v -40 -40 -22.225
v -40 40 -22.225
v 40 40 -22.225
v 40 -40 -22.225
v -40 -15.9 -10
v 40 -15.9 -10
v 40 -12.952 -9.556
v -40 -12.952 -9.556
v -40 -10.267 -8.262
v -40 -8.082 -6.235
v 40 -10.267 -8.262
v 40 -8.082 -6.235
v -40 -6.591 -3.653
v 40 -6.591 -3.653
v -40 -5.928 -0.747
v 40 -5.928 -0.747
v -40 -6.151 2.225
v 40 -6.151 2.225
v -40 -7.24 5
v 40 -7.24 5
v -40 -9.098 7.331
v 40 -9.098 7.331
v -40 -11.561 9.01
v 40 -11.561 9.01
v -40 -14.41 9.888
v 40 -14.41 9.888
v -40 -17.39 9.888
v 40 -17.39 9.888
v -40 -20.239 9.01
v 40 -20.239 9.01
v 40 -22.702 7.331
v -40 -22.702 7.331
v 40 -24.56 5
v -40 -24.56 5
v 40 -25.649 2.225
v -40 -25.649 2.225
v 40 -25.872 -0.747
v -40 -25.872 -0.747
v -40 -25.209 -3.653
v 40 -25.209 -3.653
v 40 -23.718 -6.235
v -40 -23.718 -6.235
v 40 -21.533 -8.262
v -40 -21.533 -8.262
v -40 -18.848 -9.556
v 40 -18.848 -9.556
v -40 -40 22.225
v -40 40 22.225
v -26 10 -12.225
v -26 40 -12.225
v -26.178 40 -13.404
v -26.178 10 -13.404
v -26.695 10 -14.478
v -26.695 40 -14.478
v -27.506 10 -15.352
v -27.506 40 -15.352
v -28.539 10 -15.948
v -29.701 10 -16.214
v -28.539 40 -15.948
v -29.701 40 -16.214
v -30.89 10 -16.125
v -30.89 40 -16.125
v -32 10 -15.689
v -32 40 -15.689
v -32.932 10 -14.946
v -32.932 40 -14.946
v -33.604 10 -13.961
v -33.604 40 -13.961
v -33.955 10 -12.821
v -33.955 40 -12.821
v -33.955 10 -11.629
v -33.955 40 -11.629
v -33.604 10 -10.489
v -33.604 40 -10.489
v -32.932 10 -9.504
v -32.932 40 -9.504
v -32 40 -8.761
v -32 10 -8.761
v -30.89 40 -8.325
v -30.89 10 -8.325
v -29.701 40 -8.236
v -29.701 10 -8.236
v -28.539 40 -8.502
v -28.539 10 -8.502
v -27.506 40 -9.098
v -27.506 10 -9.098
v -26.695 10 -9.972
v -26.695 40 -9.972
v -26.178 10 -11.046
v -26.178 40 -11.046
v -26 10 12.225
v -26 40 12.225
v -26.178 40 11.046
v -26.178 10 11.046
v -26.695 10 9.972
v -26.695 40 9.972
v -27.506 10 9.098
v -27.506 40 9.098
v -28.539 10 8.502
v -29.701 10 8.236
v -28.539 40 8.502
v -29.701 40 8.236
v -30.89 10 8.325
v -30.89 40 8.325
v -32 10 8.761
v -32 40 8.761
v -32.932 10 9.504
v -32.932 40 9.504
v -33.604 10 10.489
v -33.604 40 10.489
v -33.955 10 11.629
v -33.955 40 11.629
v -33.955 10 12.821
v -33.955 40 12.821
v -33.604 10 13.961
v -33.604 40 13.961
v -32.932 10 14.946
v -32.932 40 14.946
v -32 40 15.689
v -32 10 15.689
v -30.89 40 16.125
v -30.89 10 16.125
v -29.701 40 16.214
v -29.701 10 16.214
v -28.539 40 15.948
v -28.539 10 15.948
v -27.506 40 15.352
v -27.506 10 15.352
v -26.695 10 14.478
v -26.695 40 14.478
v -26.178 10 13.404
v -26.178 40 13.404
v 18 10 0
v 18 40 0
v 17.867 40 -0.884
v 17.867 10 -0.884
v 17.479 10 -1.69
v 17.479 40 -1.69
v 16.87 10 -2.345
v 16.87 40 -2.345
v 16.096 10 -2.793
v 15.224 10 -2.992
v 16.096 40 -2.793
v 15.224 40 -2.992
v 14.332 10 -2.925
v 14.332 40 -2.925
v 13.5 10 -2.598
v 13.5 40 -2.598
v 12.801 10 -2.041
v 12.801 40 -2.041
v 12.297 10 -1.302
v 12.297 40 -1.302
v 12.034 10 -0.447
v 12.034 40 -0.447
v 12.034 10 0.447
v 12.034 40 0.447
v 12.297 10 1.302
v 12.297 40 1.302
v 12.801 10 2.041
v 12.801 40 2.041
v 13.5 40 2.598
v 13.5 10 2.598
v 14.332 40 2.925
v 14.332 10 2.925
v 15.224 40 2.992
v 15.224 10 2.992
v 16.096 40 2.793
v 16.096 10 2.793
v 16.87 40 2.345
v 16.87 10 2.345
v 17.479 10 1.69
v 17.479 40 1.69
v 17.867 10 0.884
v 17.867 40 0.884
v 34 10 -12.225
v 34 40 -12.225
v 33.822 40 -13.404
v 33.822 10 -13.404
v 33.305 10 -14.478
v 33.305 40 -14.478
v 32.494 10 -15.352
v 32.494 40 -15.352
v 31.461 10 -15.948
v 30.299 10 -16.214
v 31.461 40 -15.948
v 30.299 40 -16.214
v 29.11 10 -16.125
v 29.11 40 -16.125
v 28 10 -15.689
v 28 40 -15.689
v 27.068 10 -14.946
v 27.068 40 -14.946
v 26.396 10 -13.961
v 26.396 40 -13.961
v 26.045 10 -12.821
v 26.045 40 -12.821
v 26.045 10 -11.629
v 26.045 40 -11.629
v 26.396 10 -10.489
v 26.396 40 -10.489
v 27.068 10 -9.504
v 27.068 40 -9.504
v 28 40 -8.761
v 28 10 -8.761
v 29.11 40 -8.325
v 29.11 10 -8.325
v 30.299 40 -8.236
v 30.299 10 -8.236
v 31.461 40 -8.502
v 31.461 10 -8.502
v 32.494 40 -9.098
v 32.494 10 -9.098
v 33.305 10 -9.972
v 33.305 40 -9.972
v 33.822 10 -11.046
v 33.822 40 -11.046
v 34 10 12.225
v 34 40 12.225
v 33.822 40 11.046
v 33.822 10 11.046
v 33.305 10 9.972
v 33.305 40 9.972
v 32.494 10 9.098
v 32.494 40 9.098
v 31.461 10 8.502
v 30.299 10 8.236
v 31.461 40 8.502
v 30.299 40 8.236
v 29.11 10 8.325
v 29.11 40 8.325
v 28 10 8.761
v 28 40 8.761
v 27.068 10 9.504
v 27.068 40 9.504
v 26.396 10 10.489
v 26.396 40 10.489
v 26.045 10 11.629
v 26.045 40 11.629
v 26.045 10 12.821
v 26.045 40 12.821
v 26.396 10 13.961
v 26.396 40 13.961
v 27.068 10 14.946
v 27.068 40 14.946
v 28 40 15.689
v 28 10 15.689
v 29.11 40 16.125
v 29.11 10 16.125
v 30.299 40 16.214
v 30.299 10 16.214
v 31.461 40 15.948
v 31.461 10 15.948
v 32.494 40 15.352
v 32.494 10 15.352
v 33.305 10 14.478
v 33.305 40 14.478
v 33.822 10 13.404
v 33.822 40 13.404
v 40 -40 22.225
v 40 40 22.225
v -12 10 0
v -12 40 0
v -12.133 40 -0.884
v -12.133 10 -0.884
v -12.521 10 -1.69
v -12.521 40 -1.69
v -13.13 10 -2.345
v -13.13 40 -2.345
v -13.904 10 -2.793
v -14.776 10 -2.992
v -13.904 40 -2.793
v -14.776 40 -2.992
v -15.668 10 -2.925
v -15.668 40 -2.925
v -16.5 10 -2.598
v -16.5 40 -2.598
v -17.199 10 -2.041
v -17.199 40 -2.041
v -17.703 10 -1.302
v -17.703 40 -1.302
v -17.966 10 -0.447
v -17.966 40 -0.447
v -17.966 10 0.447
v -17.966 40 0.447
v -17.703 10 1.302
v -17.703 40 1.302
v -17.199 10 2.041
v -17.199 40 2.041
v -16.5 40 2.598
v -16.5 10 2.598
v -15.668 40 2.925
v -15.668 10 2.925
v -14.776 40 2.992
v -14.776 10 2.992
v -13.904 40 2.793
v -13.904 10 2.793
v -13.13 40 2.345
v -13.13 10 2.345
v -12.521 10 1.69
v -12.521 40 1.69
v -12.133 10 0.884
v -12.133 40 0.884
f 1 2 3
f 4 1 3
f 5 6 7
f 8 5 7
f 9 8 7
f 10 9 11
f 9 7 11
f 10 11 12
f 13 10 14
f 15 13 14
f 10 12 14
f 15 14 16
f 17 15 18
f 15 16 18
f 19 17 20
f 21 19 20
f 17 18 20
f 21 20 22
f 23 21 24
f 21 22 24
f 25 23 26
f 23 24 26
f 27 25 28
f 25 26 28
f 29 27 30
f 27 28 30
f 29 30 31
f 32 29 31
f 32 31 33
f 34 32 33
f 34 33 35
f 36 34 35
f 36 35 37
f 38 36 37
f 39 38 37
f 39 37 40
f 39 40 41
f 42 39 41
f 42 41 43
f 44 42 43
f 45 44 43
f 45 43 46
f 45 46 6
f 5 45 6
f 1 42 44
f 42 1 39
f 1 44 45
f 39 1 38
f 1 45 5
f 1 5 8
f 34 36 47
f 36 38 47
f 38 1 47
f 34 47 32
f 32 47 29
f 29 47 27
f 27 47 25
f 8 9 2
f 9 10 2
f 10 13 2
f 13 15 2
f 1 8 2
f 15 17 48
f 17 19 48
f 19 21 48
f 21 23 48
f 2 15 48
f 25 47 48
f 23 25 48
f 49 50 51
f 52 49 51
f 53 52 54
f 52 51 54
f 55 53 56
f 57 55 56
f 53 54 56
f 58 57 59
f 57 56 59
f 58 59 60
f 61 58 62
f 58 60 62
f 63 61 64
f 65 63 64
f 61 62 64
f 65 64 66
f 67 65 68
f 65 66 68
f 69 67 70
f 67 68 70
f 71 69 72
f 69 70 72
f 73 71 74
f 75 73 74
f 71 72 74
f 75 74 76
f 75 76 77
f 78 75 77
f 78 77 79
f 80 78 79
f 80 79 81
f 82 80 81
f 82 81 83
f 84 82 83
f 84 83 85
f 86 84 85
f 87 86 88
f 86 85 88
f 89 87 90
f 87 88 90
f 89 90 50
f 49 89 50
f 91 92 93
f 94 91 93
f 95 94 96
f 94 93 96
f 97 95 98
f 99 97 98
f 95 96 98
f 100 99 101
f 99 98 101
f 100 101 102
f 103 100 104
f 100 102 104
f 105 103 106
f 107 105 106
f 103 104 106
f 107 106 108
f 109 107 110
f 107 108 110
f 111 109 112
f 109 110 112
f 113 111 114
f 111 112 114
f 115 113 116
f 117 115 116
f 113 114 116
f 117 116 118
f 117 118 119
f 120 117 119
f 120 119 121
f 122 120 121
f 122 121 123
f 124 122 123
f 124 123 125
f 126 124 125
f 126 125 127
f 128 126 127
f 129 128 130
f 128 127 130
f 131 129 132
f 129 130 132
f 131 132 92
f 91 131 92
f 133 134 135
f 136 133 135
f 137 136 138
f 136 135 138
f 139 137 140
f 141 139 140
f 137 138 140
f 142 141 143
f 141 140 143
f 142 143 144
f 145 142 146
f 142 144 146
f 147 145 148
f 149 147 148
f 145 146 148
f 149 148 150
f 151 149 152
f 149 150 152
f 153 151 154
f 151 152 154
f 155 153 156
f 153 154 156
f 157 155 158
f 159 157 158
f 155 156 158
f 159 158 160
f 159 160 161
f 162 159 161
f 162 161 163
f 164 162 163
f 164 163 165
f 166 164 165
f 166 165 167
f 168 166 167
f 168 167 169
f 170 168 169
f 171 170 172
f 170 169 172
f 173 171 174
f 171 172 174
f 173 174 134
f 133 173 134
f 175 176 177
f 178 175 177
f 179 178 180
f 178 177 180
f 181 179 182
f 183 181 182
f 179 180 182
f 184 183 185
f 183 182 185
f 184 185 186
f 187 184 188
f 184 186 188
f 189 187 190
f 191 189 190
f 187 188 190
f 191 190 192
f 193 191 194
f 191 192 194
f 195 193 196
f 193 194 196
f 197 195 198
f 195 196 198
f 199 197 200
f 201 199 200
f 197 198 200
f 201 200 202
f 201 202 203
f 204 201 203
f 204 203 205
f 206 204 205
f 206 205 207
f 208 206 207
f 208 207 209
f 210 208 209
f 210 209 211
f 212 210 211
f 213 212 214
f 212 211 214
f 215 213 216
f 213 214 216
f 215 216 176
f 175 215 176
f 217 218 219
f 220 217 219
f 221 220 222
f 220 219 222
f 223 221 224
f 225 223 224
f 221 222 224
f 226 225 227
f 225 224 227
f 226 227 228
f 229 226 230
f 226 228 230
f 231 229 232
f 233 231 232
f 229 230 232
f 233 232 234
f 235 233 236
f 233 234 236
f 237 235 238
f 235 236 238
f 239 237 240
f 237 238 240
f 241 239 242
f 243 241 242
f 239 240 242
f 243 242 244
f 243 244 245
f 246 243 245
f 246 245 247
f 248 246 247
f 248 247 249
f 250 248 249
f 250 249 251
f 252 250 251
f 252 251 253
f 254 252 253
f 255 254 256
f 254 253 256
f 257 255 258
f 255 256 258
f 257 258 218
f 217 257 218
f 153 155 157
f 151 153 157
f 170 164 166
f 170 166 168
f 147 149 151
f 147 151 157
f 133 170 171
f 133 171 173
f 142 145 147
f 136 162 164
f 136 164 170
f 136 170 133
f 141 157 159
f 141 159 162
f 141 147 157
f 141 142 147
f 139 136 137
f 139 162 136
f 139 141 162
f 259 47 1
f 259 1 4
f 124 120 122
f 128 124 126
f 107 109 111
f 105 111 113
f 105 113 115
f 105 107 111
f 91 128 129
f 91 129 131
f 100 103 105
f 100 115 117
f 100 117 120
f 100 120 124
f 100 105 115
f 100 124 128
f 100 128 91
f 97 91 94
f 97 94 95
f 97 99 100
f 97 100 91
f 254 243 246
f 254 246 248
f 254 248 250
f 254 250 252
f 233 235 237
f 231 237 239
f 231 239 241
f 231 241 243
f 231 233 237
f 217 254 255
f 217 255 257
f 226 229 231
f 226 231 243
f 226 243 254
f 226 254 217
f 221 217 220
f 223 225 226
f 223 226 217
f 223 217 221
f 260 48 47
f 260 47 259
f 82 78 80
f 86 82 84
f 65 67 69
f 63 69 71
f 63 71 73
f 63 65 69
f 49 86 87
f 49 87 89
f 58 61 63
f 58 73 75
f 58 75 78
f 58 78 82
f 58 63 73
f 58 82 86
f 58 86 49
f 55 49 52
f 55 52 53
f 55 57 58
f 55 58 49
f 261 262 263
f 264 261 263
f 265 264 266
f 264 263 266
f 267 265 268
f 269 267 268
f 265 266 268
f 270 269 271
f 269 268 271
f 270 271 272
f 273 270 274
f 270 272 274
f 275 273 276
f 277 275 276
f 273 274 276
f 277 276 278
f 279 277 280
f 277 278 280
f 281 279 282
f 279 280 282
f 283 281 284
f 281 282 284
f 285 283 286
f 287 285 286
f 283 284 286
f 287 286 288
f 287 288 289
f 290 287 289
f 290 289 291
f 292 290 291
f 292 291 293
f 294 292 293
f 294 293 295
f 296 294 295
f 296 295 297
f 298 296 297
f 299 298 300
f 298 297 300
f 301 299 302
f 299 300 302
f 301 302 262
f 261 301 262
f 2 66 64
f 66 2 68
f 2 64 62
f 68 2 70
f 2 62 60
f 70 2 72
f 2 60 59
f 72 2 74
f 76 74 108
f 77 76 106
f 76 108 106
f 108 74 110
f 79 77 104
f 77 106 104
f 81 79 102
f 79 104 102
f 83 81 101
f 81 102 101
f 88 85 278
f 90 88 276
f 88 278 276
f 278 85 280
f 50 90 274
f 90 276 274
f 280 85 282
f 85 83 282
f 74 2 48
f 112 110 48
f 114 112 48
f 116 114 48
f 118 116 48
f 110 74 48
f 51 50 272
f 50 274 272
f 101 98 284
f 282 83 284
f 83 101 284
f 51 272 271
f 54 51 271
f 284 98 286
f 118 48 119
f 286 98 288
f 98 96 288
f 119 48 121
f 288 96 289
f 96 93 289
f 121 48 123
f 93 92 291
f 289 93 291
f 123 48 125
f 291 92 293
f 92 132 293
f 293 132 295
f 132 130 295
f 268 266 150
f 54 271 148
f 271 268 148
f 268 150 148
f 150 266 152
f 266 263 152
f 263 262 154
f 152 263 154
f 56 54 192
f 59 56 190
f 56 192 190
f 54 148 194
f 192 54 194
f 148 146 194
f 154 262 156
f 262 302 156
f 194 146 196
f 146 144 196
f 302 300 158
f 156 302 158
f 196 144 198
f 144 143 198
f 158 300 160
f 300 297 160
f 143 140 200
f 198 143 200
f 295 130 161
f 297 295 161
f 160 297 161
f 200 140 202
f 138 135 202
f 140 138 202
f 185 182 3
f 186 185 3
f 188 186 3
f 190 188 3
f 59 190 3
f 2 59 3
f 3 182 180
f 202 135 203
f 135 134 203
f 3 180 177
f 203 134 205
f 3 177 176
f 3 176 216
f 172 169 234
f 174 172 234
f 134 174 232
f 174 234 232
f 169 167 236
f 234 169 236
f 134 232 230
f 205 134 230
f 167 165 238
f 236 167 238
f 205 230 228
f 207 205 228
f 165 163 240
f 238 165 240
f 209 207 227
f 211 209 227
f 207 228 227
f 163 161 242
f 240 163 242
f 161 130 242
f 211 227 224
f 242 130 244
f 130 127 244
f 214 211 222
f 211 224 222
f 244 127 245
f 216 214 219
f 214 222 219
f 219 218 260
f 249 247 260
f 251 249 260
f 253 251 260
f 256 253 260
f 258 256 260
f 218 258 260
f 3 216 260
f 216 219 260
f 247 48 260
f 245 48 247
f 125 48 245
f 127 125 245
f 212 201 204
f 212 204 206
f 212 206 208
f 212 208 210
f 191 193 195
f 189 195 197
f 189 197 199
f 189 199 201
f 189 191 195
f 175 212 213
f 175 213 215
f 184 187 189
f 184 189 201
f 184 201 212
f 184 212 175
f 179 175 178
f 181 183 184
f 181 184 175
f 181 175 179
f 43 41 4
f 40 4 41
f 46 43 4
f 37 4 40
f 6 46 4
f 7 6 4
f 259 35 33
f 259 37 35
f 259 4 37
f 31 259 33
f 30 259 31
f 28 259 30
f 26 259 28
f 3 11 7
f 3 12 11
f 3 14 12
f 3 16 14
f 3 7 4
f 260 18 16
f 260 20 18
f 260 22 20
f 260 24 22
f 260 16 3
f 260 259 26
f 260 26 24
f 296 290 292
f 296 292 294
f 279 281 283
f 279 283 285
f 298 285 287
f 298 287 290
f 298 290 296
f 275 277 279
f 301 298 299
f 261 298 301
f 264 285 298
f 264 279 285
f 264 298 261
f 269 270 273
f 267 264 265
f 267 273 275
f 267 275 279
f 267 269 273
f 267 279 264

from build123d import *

# Parameters (mm, degrees)
ESBO_O2_W                = 80
ESBO_O2_H                = 80
RESSALTO_EXTRUS_O2_DEPTH = 22.225
ESBO_O10_R               = 4
ESBO_O10_R_2             = 3
CORTE_EXTRUS_O5_DEPTH    = 30
ESBO_O12_R               = 10
CORTE_EXTRUS_O7_DEPTH    = 81


with BuildPart() as part:
    # Esboço2 → Ressalto-extrusão2 (new body, symmetric)
    with BuildSketch(Plane.XY):
        Rectangle(ESBO_O2_W, ESBO_O2_H)
    extrude(amount=RESSALTO_EXTRUS_O2_DEPTH, both=True)

    # Esboço10 → Corte-extrusão5 (cut)
    with BuildSketch(Plane(origin=(0, 40, 0), x_dir=(1, 0, 0), z_dir=(0, 1, 0))):
        with Locations((30, -12.225)):
            Circle(ESBO_O10_R)
        with Locations((30, 12.225)):
            Circle(ESBO_O10_R)
        with Locations((-30, -12.225)):
            Circle(ESBO_O10_R)
        with Locations((-30, 12.225)):
            Circle(ESBO_O10_R)
        with Locations((15, 0)):
            Circle(ESBO_O10_R_2)
        with Locations((-15, 0)):
            Circle(ESBO_O10_R_2)
    extrude(amount=-CORTE_EXTRUS_O5_DEPTH, mode=Mode.SUBTRACT)

    # Esboço12 → Corte-extrusão7 (cut, through all)
    with BuildSketch(Plane(origin=(40, 0, 0), x_dir=(0, 0, -1), z_dir=(1, 0, 0))):
        with Locations((0, -15.9)):
            Circle(ESBO_O12_R)
    extrude(amount=-CORTE_EXTRUS_O7_DEPTH, mode=Mode.SUBTRACT)


solid = part.part
